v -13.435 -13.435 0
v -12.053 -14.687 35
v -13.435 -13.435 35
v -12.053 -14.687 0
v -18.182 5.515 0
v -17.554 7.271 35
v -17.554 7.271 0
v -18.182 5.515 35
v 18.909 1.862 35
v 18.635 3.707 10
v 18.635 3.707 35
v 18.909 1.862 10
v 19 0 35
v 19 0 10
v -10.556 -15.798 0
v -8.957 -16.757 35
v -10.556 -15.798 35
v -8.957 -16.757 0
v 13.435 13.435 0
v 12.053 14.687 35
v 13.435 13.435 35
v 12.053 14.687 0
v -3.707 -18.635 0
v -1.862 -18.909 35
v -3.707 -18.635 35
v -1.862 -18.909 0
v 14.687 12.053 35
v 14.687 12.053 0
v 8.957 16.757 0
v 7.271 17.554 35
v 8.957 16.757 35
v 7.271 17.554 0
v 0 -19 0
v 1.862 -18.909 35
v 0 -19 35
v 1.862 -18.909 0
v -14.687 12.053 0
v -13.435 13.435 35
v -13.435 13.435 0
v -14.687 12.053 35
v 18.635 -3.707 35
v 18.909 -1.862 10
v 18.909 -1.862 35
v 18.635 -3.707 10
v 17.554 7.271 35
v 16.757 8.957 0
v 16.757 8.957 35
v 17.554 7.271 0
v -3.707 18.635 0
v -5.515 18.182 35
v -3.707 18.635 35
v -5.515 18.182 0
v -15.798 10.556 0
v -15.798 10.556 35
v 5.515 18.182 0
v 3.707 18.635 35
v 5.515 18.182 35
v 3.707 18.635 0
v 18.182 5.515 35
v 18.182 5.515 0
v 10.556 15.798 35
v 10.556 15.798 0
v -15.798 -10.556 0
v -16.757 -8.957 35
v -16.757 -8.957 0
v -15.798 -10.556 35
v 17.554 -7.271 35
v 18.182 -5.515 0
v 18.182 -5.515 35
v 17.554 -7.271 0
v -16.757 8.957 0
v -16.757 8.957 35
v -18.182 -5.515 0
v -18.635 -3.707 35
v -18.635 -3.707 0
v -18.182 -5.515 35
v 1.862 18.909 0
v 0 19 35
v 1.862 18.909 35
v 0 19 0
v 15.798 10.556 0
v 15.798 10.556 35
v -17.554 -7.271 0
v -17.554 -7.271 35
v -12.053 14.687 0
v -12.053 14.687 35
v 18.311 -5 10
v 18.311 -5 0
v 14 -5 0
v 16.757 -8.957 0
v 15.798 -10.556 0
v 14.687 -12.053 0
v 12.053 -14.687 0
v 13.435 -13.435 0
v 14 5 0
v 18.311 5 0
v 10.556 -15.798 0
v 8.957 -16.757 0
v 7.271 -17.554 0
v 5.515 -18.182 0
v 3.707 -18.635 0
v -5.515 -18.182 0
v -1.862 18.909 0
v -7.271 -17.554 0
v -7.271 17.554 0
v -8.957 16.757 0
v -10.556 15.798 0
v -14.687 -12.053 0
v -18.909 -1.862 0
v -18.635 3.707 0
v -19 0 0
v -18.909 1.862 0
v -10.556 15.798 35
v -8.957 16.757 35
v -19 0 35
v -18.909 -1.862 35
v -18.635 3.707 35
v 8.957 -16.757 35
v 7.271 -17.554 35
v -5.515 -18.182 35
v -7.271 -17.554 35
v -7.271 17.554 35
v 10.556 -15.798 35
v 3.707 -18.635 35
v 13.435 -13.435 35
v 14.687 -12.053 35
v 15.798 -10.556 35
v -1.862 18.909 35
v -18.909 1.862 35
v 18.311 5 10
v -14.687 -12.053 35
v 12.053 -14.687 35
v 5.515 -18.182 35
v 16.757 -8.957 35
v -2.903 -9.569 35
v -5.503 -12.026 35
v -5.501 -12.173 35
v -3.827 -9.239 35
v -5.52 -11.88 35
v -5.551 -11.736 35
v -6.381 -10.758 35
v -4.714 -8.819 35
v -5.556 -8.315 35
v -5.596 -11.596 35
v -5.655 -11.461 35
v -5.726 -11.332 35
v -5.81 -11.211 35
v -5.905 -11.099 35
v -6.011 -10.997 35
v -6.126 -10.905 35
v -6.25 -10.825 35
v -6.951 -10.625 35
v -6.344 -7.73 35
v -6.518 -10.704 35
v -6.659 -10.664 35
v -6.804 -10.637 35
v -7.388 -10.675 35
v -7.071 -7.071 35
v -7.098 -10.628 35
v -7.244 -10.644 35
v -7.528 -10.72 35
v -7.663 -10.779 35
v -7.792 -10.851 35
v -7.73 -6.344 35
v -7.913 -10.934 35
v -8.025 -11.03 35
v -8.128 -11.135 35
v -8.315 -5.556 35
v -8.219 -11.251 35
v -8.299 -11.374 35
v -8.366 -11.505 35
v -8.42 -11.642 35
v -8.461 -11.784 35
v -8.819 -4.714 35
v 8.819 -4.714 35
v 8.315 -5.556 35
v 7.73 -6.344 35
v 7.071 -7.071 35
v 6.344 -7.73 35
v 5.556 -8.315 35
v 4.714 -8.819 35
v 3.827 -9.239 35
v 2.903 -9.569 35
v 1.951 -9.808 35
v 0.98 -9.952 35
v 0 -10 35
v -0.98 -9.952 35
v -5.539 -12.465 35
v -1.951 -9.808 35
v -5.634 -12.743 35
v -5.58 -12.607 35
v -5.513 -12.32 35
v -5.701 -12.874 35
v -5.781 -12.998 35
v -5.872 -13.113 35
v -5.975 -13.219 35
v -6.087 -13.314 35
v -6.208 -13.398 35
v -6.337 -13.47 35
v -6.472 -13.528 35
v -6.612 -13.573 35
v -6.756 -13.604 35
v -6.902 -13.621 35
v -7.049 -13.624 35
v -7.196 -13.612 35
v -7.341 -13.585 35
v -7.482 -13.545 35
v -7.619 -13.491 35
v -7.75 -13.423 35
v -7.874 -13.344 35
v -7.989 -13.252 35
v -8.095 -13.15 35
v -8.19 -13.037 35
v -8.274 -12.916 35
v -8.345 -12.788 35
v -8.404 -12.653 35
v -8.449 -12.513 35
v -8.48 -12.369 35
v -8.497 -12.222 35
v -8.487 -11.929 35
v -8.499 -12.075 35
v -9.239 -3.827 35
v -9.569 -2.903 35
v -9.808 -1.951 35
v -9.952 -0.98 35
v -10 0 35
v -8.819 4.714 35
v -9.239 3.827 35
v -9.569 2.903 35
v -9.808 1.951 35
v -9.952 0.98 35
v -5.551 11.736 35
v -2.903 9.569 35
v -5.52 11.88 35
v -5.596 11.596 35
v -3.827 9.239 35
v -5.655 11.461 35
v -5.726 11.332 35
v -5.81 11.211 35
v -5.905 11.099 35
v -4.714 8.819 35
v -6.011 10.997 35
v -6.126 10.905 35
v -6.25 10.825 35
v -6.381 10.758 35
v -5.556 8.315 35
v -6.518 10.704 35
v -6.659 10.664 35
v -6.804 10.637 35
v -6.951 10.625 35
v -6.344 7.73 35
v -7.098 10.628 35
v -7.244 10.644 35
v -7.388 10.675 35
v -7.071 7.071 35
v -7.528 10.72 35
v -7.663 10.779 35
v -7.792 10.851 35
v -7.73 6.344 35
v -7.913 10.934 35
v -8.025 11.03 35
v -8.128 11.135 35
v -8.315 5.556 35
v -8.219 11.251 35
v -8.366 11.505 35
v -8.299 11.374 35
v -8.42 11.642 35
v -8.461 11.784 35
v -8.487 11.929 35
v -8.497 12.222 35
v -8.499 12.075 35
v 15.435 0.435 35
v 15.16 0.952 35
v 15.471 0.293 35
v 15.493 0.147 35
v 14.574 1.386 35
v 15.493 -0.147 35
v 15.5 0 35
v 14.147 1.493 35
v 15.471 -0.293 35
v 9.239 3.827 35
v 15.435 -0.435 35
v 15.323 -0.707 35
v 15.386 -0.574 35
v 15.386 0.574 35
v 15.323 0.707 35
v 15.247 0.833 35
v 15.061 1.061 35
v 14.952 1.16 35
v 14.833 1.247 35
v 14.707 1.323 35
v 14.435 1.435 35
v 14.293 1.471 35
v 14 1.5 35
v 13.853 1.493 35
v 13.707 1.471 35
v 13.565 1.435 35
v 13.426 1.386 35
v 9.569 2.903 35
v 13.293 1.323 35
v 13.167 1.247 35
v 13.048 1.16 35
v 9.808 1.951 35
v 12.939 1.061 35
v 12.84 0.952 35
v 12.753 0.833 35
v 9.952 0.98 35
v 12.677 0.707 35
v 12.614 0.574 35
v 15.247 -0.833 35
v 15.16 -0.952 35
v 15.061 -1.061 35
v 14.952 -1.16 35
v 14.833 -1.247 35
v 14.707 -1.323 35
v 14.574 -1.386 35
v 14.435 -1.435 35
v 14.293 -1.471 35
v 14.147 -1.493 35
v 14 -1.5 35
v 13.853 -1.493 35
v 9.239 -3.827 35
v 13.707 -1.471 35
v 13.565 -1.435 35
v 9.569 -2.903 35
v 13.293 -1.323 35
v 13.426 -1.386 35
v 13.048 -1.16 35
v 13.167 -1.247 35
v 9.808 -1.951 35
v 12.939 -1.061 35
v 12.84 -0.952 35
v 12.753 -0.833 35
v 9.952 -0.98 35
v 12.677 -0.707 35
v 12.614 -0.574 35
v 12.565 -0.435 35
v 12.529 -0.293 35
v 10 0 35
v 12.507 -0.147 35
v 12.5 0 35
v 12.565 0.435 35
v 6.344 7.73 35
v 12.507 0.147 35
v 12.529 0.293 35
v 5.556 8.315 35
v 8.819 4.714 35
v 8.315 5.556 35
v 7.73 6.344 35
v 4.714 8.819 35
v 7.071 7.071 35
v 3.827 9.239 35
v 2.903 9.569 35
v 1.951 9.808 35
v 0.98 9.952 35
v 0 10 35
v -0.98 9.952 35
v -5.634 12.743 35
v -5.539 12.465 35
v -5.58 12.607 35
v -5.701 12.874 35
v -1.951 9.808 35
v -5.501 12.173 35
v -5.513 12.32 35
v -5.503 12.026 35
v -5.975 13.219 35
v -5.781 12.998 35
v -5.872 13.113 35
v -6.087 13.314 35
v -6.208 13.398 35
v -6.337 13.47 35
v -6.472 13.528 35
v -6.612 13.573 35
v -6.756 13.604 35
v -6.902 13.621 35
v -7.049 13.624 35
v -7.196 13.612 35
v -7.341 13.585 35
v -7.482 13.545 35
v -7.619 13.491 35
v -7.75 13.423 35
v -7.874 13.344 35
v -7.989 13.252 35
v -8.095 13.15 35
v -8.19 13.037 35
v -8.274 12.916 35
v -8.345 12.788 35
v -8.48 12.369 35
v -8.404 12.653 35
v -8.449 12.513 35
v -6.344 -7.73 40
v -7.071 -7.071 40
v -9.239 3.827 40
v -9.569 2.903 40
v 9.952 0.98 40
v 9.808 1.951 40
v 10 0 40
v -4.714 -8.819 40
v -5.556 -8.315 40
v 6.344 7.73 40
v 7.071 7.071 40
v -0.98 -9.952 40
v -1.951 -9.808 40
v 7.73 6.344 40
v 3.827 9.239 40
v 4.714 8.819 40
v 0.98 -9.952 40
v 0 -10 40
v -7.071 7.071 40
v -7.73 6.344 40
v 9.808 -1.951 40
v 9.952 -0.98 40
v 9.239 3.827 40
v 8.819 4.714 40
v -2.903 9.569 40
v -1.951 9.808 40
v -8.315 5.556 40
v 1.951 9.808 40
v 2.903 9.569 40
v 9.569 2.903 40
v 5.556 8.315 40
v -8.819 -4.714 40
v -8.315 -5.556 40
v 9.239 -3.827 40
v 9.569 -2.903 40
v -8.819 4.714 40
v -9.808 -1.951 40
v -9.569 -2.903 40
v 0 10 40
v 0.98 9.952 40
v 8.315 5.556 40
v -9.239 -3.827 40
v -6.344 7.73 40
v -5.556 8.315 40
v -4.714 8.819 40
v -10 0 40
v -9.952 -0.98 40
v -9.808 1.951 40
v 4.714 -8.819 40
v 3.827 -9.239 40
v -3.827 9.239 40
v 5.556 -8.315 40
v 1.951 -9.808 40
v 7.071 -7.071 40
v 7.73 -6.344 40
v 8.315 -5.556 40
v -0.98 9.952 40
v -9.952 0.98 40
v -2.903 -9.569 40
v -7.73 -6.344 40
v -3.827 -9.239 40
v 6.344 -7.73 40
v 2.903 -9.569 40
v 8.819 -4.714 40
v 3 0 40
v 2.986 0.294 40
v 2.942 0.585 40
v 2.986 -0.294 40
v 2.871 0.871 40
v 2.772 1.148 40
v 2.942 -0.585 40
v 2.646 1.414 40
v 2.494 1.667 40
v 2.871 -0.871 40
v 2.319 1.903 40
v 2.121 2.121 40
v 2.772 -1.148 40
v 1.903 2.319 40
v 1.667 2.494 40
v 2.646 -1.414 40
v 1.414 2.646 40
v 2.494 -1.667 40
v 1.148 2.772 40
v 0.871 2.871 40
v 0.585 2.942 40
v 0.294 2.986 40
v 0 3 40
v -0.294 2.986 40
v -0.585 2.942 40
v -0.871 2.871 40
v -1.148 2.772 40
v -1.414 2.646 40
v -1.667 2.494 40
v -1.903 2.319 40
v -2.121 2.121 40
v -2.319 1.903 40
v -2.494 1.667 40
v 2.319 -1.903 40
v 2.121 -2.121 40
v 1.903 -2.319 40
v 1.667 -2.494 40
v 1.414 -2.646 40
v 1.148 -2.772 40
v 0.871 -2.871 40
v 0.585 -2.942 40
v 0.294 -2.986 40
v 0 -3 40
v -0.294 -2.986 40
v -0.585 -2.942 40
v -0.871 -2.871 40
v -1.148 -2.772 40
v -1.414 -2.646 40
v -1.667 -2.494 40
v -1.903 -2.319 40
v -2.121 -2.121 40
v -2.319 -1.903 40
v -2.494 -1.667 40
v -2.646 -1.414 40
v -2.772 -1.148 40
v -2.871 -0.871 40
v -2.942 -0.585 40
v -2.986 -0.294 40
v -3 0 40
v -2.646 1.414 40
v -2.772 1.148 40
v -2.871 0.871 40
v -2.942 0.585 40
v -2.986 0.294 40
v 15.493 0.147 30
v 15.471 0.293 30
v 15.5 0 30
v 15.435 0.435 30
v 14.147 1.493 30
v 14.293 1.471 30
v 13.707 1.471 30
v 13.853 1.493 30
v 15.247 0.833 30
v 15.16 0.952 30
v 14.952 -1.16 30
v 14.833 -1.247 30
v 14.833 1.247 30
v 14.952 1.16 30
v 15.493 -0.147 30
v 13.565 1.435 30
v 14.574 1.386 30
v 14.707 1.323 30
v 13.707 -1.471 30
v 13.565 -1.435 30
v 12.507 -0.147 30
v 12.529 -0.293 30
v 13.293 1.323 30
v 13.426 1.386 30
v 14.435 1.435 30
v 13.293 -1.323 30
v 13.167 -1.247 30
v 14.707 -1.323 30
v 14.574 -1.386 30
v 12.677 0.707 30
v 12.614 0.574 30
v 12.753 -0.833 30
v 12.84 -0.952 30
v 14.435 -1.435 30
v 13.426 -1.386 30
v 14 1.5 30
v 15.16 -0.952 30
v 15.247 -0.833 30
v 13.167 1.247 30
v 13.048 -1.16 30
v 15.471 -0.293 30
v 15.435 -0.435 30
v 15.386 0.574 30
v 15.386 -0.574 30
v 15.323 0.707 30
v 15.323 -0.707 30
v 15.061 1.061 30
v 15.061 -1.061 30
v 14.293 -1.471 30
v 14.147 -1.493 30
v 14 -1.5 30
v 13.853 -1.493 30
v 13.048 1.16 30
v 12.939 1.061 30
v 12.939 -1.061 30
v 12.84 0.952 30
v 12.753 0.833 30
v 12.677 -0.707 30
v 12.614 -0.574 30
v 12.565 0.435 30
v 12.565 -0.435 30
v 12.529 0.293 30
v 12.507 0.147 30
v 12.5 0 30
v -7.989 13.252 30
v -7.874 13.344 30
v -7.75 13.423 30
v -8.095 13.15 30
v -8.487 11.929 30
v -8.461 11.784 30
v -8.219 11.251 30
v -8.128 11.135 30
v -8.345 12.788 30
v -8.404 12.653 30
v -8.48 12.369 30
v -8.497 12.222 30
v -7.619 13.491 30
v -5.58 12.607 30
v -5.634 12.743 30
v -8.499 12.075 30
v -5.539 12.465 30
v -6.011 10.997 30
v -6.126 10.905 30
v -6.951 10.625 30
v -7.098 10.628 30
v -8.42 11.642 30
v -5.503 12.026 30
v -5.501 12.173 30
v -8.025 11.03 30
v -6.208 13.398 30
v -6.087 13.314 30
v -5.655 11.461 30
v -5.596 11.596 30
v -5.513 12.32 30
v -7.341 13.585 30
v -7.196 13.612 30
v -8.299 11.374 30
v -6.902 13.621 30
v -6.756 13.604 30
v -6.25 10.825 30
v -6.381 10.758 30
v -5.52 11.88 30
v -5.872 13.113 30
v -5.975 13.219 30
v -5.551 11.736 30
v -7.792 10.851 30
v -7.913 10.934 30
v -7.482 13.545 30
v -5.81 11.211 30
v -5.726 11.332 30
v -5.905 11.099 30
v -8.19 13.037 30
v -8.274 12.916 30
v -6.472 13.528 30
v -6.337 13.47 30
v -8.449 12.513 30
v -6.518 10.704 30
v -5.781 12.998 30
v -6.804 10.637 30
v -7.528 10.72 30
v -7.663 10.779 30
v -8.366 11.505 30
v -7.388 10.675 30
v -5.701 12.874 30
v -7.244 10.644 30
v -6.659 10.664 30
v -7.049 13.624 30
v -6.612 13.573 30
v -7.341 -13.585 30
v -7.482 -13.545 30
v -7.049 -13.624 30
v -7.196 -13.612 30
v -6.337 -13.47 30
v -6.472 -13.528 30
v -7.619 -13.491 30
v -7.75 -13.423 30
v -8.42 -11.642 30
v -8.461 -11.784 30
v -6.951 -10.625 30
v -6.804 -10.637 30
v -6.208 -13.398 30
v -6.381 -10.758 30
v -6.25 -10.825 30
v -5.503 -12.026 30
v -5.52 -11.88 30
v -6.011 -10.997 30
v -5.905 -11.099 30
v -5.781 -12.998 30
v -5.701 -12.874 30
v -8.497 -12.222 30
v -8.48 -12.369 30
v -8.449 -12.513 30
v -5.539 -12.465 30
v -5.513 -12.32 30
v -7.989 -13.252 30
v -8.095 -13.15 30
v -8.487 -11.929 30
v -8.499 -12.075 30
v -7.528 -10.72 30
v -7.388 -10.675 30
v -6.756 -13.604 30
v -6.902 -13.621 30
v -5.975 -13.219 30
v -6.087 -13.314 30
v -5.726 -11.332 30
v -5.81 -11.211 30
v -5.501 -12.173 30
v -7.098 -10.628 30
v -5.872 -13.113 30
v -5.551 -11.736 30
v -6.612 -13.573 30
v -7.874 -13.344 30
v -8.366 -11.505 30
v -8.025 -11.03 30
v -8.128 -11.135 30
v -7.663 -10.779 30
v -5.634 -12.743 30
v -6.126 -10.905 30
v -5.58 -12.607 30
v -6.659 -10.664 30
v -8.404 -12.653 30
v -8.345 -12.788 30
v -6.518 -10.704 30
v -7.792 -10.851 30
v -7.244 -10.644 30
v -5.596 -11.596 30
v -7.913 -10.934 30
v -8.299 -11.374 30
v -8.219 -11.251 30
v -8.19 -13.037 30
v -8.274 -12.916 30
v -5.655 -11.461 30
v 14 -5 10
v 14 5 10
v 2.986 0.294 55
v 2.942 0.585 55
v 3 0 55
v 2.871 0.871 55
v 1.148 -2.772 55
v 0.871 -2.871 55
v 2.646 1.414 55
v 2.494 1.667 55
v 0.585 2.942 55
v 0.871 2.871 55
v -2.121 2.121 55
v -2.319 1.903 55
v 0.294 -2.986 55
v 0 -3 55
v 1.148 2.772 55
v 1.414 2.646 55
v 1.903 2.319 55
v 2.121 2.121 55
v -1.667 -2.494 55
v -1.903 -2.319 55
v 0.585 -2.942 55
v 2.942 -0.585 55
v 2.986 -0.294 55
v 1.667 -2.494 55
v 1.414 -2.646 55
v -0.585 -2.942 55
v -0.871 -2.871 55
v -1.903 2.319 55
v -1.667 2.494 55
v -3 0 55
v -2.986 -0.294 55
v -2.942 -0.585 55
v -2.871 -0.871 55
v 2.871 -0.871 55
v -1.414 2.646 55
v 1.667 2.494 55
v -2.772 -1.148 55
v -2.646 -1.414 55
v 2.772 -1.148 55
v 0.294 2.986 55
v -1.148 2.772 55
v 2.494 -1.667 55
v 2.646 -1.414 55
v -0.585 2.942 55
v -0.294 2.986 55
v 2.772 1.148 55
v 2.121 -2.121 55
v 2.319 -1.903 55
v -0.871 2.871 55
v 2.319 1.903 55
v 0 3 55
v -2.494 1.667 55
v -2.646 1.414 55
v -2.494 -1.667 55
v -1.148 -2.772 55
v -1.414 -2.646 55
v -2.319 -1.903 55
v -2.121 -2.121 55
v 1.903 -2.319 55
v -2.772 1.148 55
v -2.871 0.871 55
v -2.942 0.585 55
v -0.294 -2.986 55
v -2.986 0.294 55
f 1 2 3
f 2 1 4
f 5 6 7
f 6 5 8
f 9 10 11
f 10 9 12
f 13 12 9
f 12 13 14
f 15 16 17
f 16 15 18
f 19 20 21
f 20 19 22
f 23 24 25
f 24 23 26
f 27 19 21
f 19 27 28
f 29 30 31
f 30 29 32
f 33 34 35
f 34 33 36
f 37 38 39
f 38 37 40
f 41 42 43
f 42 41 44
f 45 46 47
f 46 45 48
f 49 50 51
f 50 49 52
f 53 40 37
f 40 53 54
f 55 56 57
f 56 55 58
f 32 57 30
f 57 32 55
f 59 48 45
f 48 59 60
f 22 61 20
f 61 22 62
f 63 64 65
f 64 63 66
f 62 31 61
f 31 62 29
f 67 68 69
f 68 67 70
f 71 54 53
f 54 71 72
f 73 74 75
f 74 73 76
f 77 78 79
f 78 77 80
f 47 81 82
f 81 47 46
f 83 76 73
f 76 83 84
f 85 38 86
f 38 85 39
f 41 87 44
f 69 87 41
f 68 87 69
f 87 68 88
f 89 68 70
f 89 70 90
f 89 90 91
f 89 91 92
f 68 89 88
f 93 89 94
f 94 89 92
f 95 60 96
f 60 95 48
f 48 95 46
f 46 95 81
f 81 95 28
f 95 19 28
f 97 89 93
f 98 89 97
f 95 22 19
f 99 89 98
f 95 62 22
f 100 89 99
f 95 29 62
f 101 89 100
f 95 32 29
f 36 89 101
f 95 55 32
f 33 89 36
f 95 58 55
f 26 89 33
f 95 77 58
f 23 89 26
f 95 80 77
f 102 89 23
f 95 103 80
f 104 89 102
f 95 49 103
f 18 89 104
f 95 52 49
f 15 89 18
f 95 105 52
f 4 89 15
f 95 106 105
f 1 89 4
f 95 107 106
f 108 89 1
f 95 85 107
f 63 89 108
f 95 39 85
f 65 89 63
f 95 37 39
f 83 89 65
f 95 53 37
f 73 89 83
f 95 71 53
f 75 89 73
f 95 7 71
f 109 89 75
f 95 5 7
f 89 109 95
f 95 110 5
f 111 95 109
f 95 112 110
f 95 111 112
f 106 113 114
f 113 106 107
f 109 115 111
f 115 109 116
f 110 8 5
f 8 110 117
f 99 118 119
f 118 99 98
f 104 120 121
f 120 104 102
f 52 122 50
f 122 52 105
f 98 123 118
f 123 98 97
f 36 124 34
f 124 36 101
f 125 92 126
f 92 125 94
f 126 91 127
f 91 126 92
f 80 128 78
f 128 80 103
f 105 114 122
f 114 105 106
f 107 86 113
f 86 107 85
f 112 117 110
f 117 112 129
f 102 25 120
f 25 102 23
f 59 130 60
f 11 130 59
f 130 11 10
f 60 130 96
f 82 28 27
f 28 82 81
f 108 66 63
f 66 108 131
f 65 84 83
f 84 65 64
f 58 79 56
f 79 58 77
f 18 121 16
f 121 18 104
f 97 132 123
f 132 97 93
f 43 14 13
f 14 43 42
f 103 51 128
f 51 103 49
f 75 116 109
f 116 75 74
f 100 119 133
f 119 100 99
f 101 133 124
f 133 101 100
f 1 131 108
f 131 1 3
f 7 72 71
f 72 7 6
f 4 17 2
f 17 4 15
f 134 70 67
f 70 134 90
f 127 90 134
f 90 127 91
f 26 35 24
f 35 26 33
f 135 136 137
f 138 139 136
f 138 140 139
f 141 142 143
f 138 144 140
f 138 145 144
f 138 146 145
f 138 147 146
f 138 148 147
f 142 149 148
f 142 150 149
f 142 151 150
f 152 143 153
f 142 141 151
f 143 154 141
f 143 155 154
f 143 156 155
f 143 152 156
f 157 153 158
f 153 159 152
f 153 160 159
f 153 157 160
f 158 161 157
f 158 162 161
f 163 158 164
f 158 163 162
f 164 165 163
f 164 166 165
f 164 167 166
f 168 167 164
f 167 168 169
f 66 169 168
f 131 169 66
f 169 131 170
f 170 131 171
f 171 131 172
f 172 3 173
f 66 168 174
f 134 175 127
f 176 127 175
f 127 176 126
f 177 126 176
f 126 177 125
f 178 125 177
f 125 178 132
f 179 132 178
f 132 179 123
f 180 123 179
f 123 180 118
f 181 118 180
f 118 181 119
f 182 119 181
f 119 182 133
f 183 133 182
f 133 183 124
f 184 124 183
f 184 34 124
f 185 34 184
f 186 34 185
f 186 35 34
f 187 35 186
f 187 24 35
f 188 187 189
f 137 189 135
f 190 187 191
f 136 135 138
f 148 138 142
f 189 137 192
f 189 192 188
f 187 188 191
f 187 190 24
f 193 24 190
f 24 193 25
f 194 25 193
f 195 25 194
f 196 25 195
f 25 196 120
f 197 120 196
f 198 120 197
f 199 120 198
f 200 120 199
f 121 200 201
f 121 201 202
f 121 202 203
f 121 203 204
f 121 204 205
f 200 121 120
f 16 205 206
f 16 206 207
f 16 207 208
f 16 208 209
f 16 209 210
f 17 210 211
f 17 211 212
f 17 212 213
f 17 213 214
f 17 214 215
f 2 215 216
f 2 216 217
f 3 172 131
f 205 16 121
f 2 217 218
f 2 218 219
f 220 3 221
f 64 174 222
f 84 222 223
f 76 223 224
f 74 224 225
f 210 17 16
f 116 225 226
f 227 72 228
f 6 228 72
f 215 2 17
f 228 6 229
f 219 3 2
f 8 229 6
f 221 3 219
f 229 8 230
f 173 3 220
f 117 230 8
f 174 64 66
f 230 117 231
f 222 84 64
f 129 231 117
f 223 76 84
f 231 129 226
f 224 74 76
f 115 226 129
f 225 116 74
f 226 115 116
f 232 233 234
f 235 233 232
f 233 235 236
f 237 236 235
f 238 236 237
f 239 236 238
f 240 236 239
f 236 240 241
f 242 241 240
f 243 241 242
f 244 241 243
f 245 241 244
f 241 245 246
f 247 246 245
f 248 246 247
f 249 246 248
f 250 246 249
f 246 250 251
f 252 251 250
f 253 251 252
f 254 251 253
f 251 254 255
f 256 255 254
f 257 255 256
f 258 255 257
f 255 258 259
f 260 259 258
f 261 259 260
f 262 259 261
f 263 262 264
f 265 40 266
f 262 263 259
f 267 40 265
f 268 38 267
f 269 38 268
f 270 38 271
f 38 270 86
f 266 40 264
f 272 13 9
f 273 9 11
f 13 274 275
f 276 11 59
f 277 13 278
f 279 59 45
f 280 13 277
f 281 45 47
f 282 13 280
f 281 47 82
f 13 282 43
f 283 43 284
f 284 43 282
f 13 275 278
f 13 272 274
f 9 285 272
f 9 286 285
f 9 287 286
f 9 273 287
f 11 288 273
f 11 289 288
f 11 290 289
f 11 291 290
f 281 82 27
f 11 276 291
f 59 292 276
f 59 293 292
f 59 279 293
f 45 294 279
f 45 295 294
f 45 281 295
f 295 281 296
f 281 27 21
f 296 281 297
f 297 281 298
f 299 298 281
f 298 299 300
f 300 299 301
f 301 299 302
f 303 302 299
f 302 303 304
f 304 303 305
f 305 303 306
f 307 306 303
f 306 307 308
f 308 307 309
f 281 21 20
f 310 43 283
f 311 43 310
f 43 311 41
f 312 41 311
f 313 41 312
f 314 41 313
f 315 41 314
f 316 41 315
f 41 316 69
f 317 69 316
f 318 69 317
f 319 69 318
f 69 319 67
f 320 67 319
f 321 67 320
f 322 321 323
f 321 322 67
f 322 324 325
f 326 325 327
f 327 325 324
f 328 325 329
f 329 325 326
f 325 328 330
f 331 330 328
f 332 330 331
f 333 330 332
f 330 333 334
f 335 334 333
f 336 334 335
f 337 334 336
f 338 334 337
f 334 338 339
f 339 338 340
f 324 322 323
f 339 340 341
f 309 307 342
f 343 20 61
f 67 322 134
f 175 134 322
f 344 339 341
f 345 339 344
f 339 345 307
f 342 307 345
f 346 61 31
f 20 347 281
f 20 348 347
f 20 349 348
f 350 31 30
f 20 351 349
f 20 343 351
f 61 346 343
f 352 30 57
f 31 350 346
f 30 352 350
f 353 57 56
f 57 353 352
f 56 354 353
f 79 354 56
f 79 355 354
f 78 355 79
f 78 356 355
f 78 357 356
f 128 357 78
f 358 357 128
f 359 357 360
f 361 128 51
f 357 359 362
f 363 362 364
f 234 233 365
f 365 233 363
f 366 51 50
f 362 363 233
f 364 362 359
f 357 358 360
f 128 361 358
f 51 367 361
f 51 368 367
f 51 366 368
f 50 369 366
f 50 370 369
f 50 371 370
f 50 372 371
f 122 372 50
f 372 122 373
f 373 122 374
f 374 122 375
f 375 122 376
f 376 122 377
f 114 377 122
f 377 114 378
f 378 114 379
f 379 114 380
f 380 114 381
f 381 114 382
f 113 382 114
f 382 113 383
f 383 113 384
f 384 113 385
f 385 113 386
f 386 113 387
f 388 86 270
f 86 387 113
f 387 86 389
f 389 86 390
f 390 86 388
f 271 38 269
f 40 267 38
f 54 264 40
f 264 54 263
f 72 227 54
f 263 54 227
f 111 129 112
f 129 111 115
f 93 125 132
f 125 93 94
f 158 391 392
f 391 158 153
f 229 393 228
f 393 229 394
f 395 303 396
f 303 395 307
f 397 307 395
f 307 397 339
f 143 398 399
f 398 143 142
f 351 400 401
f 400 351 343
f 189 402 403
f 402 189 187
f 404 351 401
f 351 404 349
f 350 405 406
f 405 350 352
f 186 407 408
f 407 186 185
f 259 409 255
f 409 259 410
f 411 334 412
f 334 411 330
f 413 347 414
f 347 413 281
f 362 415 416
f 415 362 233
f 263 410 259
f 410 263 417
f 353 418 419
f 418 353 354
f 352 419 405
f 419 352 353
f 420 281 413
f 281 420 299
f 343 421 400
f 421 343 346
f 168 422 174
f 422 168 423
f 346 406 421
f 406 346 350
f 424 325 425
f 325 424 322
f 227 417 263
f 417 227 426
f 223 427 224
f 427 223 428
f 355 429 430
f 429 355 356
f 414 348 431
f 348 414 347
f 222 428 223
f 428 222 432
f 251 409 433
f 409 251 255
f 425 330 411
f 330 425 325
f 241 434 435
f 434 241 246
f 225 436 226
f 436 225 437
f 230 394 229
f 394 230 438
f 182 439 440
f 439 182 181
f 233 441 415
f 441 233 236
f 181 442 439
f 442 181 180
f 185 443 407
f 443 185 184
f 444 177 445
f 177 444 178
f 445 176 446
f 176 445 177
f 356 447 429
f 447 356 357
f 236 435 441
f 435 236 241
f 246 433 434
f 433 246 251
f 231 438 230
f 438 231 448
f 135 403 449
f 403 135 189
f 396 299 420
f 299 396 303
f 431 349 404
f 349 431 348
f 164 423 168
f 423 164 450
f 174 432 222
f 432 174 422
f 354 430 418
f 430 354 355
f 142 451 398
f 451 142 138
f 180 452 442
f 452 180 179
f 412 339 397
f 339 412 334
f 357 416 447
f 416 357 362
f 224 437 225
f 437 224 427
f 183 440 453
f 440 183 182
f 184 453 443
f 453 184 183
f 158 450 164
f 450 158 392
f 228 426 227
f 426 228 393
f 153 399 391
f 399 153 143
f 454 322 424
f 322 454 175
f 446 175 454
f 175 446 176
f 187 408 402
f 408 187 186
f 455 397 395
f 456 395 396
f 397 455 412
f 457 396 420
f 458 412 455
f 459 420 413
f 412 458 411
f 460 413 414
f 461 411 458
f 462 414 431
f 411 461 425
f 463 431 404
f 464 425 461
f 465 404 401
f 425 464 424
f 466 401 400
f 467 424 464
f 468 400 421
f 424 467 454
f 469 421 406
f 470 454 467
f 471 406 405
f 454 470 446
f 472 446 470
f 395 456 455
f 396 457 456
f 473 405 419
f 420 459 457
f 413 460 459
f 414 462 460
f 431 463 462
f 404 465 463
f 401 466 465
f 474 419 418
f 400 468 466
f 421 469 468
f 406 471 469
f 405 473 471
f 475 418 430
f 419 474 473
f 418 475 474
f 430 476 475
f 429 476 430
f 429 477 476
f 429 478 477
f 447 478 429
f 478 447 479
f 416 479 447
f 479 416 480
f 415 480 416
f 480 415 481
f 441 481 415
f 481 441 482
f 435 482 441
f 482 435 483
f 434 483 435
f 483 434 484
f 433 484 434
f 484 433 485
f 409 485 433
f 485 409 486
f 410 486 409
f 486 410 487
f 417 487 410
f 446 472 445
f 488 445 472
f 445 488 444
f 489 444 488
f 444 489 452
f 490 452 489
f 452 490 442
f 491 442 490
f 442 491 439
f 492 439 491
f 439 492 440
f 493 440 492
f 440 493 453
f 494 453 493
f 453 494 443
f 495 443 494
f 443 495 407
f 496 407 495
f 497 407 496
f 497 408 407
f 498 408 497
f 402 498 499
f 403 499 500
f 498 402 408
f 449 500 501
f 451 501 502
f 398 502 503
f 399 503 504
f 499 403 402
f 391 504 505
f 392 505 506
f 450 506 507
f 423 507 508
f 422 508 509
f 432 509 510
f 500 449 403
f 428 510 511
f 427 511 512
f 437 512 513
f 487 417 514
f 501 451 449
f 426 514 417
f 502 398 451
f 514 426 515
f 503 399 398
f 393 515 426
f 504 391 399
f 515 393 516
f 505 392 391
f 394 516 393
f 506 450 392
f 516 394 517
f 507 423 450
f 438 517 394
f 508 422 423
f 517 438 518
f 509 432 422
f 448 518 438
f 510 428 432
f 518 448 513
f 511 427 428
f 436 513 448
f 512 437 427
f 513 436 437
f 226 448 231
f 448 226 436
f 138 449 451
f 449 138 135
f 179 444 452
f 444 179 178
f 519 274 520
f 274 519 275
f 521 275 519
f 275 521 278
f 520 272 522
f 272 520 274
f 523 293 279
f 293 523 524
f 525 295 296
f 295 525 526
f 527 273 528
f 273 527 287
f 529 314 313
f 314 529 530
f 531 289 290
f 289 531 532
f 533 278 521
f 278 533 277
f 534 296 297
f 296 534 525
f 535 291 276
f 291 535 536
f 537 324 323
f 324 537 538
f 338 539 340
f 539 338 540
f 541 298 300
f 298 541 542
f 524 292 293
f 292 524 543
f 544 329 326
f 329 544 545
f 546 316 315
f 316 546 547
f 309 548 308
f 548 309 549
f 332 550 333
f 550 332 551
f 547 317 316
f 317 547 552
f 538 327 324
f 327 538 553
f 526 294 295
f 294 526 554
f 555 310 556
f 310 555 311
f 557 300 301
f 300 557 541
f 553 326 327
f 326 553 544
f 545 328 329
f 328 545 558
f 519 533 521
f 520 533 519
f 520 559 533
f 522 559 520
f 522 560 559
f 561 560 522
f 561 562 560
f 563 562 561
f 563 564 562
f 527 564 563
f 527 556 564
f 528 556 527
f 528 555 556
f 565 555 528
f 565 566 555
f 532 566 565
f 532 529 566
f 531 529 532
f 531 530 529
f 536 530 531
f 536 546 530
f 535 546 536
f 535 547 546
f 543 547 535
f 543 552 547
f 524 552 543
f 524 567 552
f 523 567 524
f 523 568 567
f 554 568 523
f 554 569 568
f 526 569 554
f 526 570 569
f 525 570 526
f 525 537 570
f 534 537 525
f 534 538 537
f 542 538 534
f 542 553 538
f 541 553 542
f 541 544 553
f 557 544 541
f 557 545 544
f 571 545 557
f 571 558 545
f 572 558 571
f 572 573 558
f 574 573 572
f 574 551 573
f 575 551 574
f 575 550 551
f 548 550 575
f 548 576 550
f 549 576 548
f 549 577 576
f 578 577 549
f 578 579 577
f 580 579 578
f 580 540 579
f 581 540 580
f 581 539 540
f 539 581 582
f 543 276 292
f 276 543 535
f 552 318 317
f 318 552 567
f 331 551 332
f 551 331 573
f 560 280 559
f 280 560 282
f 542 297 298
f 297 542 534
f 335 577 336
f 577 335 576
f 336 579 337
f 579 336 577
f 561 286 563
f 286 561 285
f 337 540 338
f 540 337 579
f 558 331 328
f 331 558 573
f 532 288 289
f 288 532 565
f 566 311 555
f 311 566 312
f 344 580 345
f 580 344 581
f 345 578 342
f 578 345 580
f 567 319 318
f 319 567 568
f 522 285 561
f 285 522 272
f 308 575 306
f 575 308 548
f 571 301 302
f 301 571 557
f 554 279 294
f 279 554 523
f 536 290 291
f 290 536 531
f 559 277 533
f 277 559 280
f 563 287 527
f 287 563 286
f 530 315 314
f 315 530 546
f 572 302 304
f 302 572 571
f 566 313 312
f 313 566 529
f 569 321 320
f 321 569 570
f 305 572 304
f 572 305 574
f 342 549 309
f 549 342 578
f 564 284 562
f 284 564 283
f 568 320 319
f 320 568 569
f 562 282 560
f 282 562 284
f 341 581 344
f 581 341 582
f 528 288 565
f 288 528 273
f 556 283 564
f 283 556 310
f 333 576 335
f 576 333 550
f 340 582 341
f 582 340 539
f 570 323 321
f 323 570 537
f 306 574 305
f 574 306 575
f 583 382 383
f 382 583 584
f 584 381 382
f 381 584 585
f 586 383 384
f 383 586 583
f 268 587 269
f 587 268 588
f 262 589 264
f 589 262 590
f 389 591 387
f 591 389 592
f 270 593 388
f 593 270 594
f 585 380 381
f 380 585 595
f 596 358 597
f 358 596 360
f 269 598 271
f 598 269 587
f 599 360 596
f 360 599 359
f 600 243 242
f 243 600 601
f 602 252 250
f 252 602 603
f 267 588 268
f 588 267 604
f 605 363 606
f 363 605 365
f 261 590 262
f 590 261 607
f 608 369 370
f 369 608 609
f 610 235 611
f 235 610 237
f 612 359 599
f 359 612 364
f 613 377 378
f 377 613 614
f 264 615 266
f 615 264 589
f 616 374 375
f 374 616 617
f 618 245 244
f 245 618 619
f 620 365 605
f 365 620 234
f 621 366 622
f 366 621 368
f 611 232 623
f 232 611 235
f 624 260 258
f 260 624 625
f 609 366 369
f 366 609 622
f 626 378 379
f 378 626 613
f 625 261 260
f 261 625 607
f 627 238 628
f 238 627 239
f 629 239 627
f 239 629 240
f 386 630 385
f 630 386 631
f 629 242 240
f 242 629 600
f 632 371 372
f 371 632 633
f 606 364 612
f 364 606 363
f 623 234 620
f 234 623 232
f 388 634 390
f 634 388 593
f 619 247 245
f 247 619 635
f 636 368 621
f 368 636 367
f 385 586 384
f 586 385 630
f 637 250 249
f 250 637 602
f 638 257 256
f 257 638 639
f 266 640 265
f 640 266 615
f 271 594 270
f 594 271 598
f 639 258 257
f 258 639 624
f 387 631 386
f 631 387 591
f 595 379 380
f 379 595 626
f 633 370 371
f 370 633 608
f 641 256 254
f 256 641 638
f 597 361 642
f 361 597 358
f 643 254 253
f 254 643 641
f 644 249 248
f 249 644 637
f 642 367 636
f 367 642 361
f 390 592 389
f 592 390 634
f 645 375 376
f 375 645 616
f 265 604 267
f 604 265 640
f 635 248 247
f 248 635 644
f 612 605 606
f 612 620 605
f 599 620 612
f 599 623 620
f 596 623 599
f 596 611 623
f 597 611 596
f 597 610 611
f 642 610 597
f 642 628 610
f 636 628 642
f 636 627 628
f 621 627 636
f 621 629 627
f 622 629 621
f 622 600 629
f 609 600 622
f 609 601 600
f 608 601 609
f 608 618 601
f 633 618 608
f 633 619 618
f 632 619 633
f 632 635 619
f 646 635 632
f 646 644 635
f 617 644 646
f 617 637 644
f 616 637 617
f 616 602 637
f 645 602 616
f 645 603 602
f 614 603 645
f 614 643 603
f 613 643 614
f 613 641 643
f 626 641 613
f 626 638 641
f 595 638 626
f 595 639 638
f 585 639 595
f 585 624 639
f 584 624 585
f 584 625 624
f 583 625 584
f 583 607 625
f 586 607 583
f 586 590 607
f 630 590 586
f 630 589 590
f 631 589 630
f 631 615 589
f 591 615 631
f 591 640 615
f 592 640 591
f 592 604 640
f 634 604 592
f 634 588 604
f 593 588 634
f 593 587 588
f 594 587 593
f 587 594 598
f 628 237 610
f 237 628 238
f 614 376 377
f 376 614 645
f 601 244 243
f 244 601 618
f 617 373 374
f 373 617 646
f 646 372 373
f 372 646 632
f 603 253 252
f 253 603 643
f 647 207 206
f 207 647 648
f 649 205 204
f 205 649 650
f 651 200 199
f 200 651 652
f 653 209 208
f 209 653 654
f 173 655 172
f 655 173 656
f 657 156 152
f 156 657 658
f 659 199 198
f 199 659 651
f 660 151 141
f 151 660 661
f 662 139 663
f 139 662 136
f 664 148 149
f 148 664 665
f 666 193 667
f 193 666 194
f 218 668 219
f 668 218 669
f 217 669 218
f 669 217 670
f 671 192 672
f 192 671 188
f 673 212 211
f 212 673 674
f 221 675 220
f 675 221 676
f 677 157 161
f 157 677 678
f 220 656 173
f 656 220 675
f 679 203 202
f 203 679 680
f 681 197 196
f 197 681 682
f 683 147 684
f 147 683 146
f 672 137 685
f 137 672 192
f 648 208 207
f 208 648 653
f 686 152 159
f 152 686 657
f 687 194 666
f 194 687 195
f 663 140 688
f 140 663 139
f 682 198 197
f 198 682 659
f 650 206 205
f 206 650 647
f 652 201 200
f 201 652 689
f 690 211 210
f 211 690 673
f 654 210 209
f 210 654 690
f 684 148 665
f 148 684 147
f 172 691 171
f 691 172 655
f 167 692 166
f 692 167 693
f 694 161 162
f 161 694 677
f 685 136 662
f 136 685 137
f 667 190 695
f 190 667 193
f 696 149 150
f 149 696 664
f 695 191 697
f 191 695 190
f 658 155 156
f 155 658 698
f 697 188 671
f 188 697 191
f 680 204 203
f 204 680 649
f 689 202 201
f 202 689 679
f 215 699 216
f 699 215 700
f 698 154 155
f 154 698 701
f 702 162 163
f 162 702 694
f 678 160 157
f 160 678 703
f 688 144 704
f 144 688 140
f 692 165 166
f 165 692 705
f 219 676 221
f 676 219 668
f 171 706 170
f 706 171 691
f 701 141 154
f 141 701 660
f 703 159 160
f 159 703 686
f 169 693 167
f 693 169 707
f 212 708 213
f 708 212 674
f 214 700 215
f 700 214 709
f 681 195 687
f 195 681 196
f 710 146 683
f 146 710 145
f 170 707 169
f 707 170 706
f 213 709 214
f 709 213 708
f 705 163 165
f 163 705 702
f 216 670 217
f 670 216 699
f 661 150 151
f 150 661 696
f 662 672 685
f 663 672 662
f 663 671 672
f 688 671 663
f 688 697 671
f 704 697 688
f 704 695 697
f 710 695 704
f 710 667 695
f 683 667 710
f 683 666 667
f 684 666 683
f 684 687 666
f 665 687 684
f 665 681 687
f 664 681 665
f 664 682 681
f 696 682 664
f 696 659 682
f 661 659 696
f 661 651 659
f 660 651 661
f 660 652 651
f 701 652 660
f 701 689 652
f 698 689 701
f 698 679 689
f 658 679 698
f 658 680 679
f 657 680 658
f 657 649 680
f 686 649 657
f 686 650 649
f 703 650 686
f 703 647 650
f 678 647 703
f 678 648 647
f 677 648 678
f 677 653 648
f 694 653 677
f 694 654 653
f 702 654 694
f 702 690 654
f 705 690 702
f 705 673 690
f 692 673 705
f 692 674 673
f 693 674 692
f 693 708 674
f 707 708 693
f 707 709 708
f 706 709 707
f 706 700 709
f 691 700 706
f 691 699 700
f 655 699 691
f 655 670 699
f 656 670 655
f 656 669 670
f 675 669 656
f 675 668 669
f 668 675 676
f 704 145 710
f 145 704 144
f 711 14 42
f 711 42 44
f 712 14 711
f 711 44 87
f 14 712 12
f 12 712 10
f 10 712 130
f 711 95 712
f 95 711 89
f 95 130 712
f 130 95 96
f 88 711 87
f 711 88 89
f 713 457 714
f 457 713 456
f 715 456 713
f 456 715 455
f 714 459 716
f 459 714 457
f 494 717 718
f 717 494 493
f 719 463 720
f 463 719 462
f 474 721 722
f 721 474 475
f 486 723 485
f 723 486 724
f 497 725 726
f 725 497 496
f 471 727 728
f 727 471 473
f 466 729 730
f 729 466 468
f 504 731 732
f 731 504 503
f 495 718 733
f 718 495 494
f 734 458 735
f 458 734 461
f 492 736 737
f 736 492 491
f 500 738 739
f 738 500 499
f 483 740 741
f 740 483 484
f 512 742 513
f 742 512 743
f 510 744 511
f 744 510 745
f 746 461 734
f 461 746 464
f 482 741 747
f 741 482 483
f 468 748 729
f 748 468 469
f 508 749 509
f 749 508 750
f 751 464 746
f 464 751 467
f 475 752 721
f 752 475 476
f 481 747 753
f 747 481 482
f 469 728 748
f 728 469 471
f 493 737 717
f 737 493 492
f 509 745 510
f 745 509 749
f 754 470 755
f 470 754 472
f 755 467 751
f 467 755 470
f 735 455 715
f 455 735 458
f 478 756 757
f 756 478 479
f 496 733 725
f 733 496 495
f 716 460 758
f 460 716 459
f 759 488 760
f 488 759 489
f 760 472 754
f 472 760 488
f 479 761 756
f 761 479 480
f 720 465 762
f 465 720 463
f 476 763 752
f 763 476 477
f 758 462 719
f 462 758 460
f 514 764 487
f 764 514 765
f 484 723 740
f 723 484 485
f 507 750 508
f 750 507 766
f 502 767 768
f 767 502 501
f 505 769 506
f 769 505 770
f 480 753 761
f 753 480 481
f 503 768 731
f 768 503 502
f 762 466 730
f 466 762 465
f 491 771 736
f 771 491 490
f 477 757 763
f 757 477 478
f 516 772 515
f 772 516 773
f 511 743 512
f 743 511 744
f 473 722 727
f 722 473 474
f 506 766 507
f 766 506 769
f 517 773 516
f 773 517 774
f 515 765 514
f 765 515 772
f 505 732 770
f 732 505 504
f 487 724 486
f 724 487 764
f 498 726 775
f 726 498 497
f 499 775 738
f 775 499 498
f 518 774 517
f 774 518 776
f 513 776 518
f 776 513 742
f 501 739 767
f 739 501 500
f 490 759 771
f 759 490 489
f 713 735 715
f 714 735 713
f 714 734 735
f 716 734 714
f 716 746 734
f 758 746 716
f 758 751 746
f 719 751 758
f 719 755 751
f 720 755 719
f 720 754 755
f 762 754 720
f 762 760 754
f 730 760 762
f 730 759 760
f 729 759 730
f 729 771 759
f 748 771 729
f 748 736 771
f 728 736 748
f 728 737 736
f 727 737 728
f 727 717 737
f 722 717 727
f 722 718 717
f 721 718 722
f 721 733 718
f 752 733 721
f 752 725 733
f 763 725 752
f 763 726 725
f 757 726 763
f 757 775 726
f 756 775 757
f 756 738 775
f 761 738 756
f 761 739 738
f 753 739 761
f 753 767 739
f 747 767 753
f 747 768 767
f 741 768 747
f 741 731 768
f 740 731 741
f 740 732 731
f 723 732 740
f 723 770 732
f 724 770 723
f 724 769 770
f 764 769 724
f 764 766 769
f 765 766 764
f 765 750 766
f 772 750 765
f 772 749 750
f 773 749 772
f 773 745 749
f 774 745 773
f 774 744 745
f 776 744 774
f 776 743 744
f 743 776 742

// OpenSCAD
// --- Encoder Dimensions (BRT38-SOM1024-RT1) ---
body_dia = 38;          // 38mm outer diameter
body_height = 35;       // Standard body depth
boss_dia = 20;          // Raised mounting pilot diameter
boss_height = 5;        // Height of the pilot boss
shaft_dia = 6;          // 6mm solid shaft
shaft_length = 15;      // Typical shaft length
mounting_bolt_circle = 28; // M3 holes spaced on a 28mm circle
$fn = 64;

// --- Render the Encoder ---
color("DimGray") encoder_body();
color("Silver") encoder_shaft();

// --- Modules ---

module encoder_body() {
    difference() {
        union() {
            // Main cylindrical body
            cylinder(h=body_height, r=body_dia/2);
            
            // Mounting Boss (Pilot)
            translate([0, 0, body_height])
                cylinder(h=boss_height, r=boss_dia/2);
        }
        
        // Mounting Holes (usually 3 holes at 120 degrees)
        for(a = [0, 120, 240]) {
            rotate([0, 0, a])
                translate([mounting_bolt_circle/2, 0, body_height - 5])
                    cylinder(h=boss_height + 6, r=1.5); // M3 holes
        }
        
        // Cable Exit Relief (Small cutout on the bottom side)
        translate([body_dia/2 - 5, -5, 0])
            cube([10, 10, 10]);
    }
}

module encoder_shaft() {
    // Shaft extends from the top of the boss
    translate([0, 0, body_height + boss_height])
        cylinder(h=shaft_length, r=shaft_dia/2);
}
